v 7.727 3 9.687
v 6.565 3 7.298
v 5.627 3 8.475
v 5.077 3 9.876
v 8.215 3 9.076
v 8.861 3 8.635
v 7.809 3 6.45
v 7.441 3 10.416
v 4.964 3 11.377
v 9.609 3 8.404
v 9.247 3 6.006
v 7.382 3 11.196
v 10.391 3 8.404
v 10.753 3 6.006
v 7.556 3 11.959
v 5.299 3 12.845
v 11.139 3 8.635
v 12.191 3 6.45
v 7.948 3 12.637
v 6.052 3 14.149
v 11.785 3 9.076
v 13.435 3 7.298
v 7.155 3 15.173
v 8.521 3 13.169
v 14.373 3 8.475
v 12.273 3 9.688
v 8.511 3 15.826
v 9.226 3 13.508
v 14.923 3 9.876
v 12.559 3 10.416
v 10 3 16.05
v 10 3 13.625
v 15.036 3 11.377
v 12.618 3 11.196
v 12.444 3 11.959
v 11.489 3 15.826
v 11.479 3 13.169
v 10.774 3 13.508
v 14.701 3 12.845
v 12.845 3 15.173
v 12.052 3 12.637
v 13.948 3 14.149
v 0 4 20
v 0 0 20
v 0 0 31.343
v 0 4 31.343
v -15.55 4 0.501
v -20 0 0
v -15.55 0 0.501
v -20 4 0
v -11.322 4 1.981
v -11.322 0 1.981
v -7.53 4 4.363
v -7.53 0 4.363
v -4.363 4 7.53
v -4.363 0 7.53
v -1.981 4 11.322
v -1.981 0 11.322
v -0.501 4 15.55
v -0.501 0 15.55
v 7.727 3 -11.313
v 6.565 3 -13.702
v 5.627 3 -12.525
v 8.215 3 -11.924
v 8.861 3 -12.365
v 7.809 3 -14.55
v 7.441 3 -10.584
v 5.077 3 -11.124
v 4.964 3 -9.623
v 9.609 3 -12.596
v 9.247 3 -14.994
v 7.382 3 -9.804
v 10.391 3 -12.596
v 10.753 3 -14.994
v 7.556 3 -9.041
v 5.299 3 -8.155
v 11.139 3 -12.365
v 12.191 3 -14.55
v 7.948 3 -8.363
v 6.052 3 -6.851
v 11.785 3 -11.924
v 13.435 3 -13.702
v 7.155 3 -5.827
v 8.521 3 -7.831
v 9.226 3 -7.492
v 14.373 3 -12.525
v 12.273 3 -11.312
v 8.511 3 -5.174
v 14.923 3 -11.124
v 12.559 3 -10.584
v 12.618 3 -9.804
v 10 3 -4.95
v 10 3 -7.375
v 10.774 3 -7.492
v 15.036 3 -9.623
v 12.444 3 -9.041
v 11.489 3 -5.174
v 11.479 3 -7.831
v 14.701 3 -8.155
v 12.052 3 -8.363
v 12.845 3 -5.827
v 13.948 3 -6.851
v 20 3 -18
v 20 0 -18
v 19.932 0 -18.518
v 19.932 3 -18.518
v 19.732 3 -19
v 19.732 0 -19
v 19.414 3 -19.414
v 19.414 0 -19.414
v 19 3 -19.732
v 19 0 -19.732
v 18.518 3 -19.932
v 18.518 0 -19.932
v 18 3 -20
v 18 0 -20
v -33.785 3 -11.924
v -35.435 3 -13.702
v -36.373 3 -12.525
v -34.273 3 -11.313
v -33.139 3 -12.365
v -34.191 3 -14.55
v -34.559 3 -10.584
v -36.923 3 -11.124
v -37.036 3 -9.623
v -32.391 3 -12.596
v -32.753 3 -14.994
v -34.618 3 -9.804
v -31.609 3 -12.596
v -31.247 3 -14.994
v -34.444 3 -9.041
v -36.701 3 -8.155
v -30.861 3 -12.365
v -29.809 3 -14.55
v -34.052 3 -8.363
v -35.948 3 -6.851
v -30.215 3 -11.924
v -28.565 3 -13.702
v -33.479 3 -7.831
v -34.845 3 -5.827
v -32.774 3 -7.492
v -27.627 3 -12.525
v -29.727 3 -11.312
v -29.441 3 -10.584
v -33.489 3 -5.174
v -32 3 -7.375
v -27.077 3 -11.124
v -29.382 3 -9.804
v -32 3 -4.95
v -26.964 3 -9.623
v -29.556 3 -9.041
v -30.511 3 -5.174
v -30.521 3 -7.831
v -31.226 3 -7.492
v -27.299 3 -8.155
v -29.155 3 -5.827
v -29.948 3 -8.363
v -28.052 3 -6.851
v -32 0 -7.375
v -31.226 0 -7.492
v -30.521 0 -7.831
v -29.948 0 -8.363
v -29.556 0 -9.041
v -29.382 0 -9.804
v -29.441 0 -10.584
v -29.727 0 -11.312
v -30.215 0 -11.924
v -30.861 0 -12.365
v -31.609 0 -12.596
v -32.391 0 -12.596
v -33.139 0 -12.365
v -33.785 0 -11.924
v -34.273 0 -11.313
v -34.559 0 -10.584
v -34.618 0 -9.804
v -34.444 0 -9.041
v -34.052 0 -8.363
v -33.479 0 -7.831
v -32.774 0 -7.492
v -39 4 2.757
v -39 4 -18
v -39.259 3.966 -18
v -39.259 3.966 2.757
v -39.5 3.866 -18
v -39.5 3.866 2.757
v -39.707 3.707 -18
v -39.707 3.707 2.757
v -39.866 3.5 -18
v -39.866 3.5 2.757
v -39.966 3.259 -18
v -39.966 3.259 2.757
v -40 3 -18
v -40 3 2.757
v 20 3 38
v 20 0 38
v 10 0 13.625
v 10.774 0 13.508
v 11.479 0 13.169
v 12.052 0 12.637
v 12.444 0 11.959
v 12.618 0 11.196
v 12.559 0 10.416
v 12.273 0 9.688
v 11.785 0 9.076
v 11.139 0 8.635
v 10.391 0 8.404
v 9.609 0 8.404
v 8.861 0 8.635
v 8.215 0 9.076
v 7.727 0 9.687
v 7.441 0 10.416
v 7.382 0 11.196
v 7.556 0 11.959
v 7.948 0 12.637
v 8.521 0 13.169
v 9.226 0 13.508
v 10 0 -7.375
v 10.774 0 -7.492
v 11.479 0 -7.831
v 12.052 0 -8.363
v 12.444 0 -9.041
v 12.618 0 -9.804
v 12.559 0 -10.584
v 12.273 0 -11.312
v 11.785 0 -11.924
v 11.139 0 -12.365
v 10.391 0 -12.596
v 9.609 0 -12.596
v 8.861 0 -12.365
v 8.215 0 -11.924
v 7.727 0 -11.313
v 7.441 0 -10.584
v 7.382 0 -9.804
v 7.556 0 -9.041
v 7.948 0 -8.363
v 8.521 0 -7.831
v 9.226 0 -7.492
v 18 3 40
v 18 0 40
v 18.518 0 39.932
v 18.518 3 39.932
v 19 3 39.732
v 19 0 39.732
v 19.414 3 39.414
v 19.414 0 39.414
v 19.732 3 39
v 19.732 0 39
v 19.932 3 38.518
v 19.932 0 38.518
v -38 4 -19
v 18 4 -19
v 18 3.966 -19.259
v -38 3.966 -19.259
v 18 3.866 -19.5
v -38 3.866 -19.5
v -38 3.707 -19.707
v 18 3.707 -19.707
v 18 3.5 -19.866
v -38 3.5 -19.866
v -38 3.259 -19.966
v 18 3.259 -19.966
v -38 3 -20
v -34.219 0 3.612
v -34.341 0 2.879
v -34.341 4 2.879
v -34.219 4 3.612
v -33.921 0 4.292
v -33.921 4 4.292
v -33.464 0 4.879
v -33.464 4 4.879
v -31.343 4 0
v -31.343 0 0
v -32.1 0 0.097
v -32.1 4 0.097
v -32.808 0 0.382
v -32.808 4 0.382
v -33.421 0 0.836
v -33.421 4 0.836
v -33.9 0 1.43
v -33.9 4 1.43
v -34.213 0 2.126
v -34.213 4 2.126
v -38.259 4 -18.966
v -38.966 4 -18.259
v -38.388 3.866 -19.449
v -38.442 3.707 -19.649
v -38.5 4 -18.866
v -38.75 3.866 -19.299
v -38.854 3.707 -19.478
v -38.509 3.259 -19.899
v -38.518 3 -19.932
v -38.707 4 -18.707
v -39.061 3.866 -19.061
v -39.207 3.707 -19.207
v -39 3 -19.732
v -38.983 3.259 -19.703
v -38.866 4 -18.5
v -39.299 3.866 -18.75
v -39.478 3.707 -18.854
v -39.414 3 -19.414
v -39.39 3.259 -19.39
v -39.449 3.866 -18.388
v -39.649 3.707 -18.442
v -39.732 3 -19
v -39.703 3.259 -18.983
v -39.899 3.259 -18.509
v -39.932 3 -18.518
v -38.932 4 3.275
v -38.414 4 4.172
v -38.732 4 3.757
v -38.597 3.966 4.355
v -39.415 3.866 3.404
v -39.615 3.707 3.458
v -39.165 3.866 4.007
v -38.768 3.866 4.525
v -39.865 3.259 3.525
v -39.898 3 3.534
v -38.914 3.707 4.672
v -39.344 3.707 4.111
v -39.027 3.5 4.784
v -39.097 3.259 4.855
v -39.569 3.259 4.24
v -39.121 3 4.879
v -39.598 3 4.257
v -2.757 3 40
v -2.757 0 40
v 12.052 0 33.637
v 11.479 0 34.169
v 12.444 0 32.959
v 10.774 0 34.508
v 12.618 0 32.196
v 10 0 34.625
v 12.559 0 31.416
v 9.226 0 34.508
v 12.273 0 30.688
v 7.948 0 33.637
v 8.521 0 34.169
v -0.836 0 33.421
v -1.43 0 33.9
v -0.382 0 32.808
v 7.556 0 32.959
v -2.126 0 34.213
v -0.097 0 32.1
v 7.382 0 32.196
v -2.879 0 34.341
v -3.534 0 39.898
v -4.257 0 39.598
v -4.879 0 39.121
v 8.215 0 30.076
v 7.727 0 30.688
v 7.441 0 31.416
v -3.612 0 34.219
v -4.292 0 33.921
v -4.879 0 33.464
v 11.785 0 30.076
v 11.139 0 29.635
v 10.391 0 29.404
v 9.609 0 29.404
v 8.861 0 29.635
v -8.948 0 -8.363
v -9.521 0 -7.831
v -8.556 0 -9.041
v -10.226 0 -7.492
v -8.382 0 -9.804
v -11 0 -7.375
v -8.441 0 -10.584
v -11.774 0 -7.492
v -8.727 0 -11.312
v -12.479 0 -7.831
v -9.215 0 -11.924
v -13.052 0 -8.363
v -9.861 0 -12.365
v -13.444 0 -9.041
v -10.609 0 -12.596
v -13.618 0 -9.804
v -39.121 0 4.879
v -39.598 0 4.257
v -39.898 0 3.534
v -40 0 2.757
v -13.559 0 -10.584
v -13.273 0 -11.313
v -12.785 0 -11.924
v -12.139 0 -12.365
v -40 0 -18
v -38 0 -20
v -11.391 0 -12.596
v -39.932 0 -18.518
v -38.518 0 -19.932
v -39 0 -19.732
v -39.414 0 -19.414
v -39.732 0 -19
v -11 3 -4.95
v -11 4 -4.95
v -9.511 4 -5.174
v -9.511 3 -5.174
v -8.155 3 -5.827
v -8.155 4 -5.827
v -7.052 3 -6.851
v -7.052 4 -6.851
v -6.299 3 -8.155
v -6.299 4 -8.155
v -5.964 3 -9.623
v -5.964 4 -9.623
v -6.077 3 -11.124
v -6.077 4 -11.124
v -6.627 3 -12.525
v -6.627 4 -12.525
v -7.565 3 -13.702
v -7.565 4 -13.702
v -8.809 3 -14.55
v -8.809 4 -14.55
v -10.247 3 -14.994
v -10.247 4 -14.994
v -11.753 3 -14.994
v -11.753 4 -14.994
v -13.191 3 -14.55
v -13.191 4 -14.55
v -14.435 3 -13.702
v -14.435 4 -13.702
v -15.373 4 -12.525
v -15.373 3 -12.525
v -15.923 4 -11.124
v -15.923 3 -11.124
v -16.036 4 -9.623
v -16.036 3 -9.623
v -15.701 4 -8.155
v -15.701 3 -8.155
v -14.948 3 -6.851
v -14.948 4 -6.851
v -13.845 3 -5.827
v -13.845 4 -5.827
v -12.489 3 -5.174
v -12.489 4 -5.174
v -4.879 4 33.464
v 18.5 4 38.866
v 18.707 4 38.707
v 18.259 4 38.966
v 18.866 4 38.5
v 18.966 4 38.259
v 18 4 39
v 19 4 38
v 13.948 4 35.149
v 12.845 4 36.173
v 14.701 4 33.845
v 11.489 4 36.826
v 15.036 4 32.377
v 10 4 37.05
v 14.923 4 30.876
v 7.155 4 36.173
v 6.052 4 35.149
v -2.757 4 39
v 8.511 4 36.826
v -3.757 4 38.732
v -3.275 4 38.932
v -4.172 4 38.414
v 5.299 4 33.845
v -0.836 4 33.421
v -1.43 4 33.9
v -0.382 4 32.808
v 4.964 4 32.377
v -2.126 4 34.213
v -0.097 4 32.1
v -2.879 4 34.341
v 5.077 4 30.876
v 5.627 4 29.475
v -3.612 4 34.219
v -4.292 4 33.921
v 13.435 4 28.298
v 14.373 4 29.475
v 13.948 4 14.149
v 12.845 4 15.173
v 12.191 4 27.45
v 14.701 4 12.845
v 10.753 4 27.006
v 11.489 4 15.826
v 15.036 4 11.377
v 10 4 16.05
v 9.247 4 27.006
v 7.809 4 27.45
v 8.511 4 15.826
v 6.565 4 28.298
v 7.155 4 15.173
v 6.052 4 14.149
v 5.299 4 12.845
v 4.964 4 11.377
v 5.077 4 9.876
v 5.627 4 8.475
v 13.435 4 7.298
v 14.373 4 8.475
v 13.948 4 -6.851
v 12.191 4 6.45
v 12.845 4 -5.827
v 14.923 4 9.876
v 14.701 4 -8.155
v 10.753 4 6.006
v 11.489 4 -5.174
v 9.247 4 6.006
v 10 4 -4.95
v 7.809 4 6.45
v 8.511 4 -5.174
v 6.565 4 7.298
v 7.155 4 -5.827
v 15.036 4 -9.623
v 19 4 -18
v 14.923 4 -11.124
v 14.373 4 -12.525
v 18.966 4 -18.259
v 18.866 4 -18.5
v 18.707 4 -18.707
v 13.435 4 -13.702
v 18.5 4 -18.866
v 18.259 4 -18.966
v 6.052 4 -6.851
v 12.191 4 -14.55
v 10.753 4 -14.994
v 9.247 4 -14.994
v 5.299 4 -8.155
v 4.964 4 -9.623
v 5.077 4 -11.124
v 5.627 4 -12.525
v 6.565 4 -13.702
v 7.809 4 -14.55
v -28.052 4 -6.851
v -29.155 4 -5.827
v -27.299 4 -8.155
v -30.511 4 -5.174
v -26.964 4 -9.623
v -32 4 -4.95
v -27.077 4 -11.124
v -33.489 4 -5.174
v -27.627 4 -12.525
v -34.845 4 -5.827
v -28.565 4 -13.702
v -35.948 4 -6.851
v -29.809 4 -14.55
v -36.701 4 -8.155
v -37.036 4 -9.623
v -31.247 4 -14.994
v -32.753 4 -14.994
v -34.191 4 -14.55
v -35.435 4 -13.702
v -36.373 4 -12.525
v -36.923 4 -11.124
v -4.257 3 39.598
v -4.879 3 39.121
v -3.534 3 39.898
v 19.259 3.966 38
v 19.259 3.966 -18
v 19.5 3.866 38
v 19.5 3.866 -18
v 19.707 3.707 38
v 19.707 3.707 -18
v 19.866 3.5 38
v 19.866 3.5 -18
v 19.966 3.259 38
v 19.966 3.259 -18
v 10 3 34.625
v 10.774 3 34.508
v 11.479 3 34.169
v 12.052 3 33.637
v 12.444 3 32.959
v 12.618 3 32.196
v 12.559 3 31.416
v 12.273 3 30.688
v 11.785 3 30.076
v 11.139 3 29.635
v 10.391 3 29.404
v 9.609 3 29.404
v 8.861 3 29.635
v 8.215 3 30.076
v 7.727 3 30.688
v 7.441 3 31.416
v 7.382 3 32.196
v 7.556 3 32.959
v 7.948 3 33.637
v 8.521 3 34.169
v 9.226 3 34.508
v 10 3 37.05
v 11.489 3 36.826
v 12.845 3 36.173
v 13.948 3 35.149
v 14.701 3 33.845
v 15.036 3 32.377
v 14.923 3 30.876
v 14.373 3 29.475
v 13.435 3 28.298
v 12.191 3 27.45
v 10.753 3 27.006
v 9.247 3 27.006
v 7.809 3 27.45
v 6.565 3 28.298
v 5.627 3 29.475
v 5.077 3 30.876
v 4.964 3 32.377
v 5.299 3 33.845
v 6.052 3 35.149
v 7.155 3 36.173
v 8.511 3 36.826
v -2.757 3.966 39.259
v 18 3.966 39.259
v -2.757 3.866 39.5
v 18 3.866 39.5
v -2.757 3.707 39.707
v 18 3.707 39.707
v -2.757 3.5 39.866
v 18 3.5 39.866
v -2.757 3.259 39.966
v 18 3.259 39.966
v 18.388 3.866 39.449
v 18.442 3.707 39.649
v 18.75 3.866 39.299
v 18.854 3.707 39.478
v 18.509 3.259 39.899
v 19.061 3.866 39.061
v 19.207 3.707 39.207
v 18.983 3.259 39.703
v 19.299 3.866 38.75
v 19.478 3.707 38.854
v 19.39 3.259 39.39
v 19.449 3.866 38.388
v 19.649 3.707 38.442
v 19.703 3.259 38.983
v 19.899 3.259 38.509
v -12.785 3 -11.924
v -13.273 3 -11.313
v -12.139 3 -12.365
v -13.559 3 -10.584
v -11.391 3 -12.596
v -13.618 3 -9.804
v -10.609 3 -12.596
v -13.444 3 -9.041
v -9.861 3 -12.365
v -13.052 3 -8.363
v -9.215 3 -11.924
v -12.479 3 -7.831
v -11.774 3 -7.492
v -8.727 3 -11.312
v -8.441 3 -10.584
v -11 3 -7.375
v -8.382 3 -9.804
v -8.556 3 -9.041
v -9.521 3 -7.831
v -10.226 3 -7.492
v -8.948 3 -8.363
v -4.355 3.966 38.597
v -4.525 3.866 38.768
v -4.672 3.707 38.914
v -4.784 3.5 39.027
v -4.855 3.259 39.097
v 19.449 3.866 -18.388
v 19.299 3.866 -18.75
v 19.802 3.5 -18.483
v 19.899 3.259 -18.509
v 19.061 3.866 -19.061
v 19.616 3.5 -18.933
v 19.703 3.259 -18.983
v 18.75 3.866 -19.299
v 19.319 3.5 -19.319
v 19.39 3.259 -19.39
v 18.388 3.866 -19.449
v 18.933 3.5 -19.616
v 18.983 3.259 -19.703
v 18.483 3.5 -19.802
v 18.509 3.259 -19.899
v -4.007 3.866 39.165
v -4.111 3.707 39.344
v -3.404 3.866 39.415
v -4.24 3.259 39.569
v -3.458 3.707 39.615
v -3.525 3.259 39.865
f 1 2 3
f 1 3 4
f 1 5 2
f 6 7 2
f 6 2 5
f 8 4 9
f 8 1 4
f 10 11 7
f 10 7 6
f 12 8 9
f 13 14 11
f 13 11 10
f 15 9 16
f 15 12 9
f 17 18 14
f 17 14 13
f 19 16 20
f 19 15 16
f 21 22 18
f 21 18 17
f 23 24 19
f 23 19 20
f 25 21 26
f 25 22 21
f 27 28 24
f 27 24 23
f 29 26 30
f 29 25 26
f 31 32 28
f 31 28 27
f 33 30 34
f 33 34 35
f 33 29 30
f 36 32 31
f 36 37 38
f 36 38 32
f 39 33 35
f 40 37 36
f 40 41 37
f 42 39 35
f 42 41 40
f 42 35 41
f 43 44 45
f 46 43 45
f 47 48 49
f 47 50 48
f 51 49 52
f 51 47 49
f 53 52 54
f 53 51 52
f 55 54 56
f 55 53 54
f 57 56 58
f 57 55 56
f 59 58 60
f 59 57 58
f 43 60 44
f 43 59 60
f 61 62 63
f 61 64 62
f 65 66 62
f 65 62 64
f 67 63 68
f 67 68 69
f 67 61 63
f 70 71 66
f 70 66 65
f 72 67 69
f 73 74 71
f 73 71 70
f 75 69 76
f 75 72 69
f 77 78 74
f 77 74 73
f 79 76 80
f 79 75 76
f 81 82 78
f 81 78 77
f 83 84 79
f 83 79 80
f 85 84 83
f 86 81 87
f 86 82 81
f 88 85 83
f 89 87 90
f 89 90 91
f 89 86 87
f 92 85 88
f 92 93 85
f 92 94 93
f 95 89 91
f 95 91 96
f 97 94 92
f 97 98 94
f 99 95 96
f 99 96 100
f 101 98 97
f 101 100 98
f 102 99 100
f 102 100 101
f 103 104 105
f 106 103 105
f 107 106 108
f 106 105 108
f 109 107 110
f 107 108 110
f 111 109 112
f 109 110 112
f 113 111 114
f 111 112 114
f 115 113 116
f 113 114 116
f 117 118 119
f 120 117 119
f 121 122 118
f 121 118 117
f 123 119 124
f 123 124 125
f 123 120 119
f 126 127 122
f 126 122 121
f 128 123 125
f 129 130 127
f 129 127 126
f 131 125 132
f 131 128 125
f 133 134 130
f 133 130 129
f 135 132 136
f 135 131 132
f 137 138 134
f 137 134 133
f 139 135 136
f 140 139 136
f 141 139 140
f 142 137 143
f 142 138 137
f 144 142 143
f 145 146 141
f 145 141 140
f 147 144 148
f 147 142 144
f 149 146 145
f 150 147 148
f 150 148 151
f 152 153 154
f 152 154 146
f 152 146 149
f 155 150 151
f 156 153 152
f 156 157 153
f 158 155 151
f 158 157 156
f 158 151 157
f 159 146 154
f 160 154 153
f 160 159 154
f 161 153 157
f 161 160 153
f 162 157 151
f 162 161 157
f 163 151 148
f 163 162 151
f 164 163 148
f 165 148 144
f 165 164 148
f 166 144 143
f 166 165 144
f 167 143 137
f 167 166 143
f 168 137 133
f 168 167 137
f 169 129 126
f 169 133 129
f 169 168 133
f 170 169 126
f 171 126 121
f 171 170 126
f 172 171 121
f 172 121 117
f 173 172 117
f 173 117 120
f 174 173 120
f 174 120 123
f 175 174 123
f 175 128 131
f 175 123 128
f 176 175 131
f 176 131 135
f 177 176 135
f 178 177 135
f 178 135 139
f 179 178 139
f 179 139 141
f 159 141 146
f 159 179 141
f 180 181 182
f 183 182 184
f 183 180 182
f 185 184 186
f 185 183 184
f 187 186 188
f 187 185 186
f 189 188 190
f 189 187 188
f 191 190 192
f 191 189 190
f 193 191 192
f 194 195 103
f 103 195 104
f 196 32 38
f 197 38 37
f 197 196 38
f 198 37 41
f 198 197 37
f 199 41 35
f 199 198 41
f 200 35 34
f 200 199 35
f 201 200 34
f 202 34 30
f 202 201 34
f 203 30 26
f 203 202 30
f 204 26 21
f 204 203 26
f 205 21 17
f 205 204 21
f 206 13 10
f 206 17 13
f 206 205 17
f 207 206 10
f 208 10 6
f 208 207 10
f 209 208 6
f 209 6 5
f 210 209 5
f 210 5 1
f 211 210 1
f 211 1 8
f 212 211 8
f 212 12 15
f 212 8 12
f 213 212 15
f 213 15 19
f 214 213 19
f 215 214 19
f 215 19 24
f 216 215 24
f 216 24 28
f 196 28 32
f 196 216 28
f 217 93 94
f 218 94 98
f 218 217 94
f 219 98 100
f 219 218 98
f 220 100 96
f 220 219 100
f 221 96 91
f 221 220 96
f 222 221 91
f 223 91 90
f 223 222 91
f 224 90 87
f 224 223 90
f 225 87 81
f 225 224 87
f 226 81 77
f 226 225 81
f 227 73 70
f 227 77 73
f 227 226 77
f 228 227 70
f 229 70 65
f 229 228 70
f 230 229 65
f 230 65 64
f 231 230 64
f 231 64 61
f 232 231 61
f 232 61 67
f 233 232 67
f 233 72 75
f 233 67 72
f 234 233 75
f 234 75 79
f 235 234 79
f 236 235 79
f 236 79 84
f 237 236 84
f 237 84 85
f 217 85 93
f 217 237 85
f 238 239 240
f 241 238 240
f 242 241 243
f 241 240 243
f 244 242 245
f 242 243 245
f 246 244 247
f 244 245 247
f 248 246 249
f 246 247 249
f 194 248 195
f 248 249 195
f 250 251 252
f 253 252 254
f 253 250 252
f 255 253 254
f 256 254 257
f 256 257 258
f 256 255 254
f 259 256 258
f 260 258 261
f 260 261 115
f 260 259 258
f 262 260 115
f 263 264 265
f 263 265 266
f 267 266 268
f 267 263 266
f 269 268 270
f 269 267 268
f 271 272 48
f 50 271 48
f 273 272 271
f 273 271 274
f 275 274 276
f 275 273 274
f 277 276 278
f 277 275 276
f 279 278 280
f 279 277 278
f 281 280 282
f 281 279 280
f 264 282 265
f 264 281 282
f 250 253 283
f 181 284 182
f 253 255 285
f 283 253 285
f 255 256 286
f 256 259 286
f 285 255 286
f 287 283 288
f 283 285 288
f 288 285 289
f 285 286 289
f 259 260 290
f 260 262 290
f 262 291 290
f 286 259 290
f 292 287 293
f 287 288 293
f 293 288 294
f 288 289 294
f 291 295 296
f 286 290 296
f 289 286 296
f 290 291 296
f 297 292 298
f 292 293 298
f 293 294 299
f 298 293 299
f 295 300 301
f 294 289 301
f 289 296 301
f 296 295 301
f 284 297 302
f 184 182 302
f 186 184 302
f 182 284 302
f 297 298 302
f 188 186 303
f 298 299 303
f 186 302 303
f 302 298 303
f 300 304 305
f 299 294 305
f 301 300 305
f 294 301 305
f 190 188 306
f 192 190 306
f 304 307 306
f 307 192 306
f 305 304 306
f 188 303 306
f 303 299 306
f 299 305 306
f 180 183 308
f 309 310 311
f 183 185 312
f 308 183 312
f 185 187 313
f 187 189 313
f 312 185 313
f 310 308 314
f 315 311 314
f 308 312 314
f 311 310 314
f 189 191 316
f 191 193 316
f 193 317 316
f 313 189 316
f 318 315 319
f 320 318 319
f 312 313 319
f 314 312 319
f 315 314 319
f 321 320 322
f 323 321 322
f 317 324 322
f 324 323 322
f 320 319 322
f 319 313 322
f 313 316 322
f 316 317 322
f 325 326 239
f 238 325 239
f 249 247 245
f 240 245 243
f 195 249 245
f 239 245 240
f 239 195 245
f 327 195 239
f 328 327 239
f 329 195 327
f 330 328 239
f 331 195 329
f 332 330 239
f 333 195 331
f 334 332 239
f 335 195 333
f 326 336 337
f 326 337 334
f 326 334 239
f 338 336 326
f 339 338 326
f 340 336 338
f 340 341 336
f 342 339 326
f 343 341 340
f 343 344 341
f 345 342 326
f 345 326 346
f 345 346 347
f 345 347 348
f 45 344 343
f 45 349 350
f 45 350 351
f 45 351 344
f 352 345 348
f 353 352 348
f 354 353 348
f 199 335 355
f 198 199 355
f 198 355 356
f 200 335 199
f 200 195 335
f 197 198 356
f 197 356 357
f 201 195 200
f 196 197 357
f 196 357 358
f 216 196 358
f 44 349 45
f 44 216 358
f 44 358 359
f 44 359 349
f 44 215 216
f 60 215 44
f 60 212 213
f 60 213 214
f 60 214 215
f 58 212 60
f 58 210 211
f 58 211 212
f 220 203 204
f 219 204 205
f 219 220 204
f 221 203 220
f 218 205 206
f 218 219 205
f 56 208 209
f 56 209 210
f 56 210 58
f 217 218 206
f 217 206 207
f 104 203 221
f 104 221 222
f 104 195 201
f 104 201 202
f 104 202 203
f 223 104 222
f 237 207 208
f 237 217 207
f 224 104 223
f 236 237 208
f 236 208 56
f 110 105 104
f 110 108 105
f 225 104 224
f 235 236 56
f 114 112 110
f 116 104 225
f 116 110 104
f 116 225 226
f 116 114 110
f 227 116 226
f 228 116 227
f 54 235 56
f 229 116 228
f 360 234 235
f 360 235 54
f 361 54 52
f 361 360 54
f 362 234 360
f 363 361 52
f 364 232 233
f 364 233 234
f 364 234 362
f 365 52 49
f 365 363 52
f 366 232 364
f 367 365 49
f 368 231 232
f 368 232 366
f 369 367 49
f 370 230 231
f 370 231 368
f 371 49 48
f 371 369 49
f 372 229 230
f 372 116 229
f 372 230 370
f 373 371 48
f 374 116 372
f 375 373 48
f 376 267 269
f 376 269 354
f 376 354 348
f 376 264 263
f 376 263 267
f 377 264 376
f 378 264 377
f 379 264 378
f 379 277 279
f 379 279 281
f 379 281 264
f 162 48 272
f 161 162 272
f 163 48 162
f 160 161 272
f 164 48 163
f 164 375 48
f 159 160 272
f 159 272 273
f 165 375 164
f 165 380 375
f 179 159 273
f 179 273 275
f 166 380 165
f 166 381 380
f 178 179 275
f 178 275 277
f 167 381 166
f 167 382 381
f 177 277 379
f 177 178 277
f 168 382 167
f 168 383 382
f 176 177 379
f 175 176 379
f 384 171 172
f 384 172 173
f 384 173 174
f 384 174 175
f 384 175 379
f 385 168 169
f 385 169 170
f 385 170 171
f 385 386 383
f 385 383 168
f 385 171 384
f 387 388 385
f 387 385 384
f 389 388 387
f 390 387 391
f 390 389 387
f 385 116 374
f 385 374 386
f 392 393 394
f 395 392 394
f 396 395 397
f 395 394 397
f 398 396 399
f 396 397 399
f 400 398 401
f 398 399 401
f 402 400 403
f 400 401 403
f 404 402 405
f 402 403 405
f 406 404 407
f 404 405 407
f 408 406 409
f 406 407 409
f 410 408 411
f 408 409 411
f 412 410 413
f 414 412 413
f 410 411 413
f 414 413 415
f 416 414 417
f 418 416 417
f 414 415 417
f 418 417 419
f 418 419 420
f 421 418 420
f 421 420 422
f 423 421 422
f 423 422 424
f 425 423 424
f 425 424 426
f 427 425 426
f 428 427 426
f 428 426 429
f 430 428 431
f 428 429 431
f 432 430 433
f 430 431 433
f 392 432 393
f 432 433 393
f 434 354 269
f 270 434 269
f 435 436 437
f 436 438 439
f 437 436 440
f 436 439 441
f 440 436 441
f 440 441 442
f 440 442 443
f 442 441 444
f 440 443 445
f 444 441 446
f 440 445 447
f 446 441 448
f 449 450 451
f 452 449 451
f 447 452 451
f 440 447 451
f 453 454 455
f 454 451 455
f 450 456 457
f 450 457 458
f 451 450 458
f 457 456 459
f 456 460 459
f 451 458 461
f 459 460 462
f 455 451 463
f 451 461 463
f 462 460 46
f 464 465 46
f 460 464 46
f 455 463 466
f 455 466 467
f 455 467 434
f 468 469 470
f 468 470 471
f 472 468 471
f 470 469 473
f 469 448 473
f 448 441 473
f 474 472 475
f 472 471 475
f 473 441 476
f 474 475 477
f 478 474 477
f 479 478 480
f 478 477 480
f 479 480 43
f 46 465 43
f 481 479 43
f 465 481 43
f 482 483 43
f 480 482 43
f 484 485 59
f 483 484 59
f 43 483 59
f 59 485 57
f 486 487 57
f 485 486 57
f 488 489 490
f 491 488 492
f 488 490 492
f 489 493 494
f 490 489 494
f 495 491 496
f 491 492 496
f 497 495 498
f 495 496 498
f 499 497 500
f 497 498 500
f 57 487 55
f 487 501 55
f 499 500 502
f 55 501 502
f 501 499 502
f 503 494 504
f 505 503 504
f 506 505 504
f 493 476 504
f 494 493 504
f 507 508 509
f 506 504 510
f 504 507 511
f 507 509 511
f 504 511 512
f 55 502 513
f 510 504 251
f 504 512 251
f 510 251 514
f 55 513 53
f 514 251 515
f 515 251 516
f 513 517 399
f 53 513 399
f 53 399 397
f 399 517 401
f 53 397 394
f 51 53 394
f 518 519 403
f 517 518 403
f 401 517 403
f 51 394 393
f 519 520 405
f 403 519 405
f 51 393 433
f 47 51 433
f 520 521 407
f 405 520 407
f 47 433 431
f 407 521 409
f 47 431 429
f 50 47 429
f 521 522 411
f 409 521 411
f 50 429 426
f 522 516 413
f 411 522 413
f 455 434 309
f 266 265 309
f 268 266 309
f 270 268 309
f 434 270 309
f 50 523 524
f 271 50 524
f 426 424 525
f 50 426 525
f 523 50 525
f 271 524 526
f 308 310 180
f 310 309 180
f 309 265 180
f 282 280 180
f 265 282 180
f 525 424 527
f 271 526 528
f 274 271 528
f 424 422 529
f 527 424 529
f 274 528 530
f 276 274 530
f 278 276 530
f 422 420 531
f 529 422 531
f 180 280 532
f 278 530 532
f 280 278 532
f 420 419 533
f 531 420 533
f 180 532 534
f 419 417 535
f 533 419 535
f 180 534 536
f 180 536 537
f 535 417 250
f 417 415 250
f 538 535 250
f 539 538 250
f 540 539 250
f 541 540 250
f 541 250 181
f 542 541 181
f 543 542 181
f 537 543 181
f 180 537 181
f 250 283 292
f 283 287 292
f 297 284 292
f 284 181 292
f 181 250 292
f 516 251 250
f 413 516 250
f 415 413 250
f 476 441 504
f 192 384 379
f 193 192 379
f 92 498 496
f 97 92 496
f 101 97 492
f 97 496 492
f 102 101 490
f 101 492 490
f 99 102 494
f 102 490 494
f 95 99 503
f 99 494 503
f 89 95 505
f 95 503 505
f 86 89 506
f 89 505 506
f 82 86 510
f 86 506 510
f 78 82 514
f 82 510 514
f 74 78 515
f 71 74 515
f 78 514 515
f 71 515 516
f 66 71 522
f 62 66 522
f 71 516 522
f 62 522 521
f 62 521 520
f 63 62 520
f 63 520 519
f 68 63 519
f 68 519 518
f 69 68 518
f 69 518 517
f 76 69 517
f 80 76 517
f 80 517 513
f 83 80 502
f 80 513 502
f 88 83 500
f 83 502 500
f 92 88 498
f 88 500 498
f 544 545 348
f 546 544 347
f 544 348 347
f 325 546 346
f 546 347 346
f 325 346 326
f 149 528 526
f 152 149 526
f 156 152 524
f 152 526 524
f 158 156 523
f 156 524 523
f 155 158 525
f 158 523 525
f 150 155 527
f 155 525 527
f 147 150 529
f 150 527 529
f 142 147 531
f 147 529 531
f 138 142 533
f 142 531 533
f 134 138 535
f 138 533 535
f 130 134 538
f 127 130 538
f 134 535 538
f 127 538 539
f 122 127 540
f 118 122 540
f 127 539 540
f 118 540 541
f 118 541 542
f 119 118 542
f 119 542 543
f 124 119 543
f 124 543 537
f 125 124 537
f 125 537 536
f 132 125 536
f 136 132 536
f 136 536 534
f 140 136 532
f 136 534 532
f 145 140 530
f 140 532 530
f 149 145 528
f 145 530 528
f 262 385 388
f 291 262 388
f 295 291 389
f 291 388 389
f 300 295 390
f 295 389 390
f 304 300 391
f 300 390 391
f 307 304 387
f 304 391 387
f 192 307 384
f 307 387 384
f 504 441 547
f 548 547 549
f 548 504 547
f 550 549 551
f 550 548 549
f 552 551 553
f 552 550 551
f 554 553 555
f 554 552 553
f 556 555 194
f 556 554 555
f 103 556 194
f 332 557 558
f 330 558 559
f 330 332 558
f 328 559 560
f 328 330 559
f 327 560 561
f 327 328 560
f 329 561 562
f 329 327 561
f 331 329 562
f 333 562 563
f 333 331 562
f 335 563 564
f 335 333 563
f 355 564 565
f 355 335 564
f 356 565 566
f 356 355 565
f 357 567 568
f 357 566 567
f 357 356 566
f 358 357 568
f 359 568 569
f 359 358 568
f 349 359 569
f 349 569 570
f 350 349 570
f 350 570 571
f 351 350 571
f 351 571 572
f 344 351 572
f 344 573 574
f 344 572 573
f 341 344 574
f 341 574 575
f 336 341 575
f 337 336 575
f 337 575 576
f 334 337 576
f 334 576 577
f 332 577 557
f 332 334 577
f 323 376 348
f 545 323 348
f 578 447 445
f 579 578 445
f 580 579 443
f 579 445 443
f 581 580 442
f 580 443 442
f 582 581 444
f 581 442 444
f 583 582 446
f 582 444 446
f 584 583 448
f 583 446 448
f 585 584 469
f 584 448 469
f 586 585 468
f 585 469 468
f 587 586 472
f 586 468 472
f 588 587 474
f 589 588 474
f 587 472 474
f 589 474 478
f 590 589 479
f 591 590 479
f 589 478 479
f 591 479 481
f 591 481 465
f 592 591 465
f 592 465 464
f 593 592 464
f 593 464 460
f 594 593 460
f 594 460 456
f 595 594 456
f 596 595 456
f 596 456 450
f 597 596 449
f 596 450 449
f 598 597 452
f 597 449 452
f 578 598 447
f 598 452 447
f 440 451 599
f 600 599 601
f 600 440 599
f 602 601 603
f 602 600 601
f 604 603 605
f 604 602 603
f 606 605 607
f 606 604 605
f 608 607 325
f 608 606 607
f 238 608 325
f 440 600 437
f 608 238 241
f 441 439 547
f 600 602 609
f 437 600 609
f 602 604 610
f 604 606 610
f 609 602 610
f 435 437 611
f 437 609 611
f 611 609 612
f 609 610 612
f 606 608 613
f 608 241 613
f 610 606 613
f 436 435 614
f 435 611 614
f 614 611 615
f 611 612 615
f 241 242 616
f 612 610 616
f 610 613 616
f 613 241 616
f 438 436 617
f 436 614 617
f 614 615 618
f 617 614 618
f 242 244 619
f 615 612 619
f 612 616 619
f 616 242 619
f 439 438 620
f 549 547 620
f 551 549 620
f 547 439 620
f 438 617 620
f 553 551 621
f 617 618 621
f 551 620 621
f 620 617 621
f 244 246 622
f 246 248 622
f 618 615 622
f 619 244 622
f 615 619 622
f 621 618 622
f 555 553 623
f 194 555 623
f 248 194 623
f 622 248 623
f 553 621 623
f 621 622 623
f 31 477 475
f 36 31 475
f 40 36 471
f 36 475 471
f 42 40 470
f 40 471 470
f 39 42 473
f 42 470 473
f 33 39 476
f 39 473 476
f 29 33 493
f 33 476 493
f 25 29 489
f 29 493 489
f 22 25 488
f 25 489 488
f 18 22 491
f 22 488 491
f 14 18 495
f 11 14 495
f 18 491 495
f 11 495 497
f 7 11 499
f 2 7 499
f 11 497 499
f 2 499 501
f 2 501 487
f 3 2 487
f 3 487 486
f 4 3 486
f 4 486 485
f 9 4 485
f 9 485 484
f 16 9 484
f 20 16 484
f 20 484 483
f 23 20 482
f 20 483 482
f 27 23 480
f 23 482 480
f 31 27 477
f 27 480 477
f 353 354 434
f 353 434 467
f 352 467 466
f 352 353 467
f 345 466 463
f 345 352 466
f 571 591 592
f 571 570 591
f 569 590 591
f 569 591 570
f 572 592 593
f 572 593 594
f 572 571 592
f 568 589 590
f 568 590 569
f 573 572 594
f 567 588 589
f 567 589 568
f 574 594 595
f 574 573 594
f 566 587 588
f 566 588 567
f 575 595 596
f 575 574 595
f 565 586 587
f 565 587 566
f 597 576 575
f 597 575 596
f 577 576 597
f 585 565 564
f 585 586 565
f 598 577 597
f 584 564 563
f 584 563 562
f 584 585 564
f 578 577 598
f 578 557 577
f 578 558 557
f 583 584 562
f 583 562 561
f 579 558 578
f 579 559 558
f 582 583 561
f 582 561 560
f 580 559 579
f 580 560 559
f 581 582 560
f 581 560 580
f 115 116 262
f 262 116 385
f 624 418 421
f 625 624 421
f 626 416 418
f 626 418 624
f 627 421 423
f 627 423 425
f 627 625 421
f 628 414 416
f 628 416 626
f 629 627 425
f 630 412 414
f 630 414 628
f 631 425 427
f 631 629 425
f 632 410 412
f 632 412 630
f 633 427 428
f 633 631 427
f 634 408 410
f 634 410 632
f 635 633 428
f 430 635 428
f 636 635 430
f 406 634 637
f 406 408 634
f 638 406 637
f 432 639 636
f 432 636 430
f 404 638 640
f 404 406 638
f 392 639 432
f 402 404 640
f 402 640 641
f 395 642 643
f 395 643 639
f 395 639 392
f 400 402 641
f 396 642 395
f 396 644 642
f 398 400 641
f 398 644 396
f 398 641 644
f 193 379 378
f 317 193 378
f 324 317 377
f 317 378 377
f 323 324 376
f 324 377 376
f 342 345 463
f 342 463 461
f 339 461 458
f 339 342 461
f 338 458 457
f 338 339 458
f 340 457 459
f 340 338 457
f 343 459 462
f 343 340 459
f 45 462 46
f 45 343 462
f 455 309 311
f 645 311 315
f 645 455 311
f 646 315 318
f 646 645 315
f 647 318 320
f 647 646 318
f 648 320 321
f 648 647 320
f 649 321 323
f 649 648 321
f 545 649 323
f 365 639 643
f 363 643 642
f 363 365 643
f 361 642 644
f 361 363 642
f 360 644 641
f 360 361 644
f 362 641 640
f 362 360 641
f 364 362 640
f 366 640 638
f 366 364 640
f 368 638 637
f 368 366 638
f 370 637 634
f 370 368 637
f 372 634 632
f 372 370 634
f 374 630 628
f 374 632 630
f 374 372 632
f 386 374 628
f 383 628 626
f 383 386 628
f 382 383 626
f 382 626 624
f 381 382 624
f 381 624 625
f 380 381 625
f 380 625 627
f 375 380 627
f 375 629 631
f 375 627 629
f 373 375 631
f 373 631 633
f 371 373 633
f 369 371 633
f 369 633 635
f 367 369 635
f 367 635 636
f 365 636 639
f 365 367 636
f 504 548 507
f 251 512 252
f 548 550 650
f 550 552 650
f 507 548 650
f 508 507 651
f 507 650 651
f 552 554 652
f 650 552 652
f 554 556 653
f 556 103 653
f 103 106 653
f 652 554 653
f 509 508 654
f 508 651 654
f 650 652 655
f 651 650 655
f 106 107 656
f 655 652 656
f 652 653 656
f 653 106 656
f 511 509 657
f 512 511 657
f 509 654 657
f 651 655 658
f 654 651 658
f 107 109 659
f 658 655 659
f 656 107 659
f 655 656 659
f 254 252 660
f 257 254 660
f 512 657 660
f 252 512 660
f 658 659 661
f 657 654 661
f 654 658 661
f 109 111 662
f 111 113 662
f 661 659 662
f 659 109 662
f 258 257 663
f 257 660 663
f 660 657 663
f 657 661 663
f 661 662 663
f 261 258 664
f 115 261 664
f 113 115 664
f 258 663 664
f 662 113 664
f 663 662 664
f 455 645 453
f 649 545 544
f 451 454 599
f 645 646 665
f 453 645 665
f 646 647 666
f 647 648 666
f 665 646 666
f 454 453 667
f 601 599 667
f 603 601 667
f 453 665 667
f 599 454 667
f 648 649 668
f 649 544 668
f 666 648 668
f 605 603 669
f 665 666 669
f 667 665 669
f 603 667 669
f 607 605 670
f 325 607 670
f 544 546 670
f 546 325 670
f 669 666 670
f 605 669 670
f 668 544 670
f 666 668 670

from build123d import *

# Parameters (mm, degrees)
SKETCH1_R           = 2.625
BOSS_EXTRUDE1_DEPTH = 4
FILLET1_R           = 20
FILLET2_R           = 3
SKETCH2_R           = 5.05
CUT_EXTRUDE1_DEPTH  = 1
FILLET3_R           = 1


with BuildPart() as part:
    # Sketch1 → Boss-Extrude1 (new body)
    with BuildSketch(Plane(origin=(0, 0, 0), x_dir=(1, 0, 0), z_dir=(0, 1, 0))):
        with BuildLine():
            Line((2, -40), (18, -40))
            ThreePointArc((18, -40), (19.414213562, -39.414213562), (20, -38))
            Line((20, -38), (20, -10.175438596))
            Line((20, -10.175438596), (20, 18))
            ThreePointArc((20, 18), (19.414213562, 19.414213562), (18, 20))
            Line((18, 20), (-38, 20))
            ThreePointArc((-38, 20), (-39.414213562, 19.414213562), (-40, 18))
            Line((-40, 18), (-40, 2))
            Line((-40, 2), (-40, -4))
            Line((-40, -4), (-4, -40))
            Line((-4, -40), (2, -40))
        make_face()
        with Locations(Location((-32, 10, 0), (0, 0, 270))):
            Circle(SKETCH1_R, mode=Mode.SUBTRACT)
        with Locations(Location((-11, 10, 0), (0, 0, 270))):
            Circle(SKETCH1_R, mode=Mode.SUBTRACT)
        with Locations(Location((10, -32, 0), (0, 0, 270))):
            Circle(SKETCH1_R, mode=Mode.SUBTRACT)
        with Locations(Location((10, 10, 0), (0, 0, 270))):
            Circle(SKETCH1_R, mode=Mode.SUBTRACT)
        with Locations(Location((10, -11, 0), (0, 0, 270))):
            Circle(SKETCH1_R, mode=Mode.SUBTRACT)
        Polygon((0, 0), (0, -34.343145751), (-4, -34.343145751), (-34.343145751, -4), (-34.343145751, 0), align=None, mode=Mode.SUBTRACT)
    extrude(amount=BOSS_EXTRUDE1_DEPTH)

    # Fillet1
    fillet1_edges = [part.edges().sort_by_distance(p)[0] for p in [
        (0, 2, 0),
    ]]
    fillet(fillet1_edges, radius=FILLET1_R)

    # Fillet2
    # the kernel refuses this fillet: 3 mm, written as the material it adds along each edge
    with BuildSketch(Plane(origin=(-4, 0, 34.343145751), x_dir=(1, 0, 0), z_dir=(0, 1, 0)), Plane(origin=(-34.343145751, 0, 4), x_dir=(0.7071067811865454, 0, 0.7071067811865497), z_dir=(0, 1, 0))) as fillet2_piece_1:
        with BuildLine():
            CenterArc((FILLET2_R * 0.414213562373, FILLET2_R), FILLET2_R, 225, 45)
            Line((-FILLET2_R * 0.292893218813, FILLET2_R * 0.292893218813), (0, 0))
            Line((0, 0), (FILLET2_R * 0.414213562373, 0))
        make_face()
    extrude(amount=4)
    with BuildSketch(Plane(origin=(0, 0, 34.343145751), x_dir=(0, 0, -1), z_dir=(0, 1, 0))) as fillet2_piece_2:
        with BuildLine():
            CenterArc((FILLET2_R, FILLET2_R), FILLET2_R, 180, 90)
            Line((0, FILLET2_R), (0, 0))
            Line((0, 0), (FILLET2_R, 0))
        make_face()
    extrude(amount=4)
    with BuildSketch(Plane(origin=(-34.343145751, 0, 0), x_dir=(1, 0, 0), z_dir=(0, 1, 0))) as fillet2_piece_3:
        with BuildLine():
            CenterArc((FILLET2_R, -FILLET2_R), FILLET2_R, 90, 90)
            Line((0, -FILLET2_R), (0, 0))
            Line((0, 0), (FILLET2_R, 0))
        make_face()
    extrude(amount=4)
    # the kernel refuses this fillet: 3 mm, written as the material it takes off along each edge
    with BuildSketch(Plane(origin=(-40, -3.106601718, 4), x_dir=(0, 0, -1), z_dir=(0, 1, 0))) as fillet2_2_piece_1:
        with BuildLine():
            CenterArc((FILLET2_R * 0.414213562373, -FILLET2_R), FILLET2_R, 90, 45)
            Line((-FILLET2_R * 0.292893218813, -FILLET2_R * 0.292893218813), (0, 0))
            Line((0, 0), (FILLET2_R * 0.414213562373, 0))
        make_face()
    extrude(amount=10.213203436, mode=Mode.SUBTRACT)
    with BuildSketch(Plane(origin=(-4, -3.106601718, 40), x_dir=(1, 0, 0), z_dir=(0, 1, 0))) as fillet2_2_piece_2:
        with BuildLine():
            CenterArc((FILLET2_R * 0.414213562373, FILLET2_R), FILLET2_R, 225, 45)
            Line((-FILLET2_R * 0.292893218813, FILLET2_R * 0.292893218813), (0, 0))
            Line((0, 0), (FILLET2_R * 0.414213562373, 0))
        make_face()
    extrude(amount=10.213203436, mode=Mode.SUBTRACT)

    # Sketch2 → Cut-Extrude1 (cut)
    with BuildSketch(Plane(origin=(0, 4, 0), x_dir=(1, 0, 0), z_dir=(0, 1, 0))):
        with Locations(Location((-32, 10, 0), (0, 0, 270))):
            Circle(SKETCH2_R)
        with Locations(Location((-11, 10, 0), (0, 0, 270))):
            Circle(SKETCH2_R)
        with Locations(Location((10, 10, 0), (0, 0, 270))):
            Circle(SKETCH2_R)
        with Locations(Location((10, -11, 0), (0, 0, 270))):
            Circle(SKETCH2_R)
        with Locations(Location((10, -32, 0), (0, 0, 270))):
            Circle(SKETCH2_R)
    extrude(amount=-CUT_EXTRUDE1_DEPTH, mode=Mode.SUBTRACT)

    # Fillet3
    fillet3_edges = [part.edges().sort_by_distance(p)[0] for p in [
        (-10, 4, -20),
        (-39.414213562, 4, -19.414213562),
        (-40, 4, -7.621320344),
        (19.414213562, 4, 39.414213562),
        (20, 4, 10),
        (-22, 4, 22),
        (7.621320344, 4, 40),
        (-3.90540961, 4, 39.771638598),
        (-39.771638598, 4, 3.90540961),
        (19.414213562, 4, -19.414213562),
    ]]
    fillet(fillet3_edges, radius=FILLET3_R)


solid = part.part
